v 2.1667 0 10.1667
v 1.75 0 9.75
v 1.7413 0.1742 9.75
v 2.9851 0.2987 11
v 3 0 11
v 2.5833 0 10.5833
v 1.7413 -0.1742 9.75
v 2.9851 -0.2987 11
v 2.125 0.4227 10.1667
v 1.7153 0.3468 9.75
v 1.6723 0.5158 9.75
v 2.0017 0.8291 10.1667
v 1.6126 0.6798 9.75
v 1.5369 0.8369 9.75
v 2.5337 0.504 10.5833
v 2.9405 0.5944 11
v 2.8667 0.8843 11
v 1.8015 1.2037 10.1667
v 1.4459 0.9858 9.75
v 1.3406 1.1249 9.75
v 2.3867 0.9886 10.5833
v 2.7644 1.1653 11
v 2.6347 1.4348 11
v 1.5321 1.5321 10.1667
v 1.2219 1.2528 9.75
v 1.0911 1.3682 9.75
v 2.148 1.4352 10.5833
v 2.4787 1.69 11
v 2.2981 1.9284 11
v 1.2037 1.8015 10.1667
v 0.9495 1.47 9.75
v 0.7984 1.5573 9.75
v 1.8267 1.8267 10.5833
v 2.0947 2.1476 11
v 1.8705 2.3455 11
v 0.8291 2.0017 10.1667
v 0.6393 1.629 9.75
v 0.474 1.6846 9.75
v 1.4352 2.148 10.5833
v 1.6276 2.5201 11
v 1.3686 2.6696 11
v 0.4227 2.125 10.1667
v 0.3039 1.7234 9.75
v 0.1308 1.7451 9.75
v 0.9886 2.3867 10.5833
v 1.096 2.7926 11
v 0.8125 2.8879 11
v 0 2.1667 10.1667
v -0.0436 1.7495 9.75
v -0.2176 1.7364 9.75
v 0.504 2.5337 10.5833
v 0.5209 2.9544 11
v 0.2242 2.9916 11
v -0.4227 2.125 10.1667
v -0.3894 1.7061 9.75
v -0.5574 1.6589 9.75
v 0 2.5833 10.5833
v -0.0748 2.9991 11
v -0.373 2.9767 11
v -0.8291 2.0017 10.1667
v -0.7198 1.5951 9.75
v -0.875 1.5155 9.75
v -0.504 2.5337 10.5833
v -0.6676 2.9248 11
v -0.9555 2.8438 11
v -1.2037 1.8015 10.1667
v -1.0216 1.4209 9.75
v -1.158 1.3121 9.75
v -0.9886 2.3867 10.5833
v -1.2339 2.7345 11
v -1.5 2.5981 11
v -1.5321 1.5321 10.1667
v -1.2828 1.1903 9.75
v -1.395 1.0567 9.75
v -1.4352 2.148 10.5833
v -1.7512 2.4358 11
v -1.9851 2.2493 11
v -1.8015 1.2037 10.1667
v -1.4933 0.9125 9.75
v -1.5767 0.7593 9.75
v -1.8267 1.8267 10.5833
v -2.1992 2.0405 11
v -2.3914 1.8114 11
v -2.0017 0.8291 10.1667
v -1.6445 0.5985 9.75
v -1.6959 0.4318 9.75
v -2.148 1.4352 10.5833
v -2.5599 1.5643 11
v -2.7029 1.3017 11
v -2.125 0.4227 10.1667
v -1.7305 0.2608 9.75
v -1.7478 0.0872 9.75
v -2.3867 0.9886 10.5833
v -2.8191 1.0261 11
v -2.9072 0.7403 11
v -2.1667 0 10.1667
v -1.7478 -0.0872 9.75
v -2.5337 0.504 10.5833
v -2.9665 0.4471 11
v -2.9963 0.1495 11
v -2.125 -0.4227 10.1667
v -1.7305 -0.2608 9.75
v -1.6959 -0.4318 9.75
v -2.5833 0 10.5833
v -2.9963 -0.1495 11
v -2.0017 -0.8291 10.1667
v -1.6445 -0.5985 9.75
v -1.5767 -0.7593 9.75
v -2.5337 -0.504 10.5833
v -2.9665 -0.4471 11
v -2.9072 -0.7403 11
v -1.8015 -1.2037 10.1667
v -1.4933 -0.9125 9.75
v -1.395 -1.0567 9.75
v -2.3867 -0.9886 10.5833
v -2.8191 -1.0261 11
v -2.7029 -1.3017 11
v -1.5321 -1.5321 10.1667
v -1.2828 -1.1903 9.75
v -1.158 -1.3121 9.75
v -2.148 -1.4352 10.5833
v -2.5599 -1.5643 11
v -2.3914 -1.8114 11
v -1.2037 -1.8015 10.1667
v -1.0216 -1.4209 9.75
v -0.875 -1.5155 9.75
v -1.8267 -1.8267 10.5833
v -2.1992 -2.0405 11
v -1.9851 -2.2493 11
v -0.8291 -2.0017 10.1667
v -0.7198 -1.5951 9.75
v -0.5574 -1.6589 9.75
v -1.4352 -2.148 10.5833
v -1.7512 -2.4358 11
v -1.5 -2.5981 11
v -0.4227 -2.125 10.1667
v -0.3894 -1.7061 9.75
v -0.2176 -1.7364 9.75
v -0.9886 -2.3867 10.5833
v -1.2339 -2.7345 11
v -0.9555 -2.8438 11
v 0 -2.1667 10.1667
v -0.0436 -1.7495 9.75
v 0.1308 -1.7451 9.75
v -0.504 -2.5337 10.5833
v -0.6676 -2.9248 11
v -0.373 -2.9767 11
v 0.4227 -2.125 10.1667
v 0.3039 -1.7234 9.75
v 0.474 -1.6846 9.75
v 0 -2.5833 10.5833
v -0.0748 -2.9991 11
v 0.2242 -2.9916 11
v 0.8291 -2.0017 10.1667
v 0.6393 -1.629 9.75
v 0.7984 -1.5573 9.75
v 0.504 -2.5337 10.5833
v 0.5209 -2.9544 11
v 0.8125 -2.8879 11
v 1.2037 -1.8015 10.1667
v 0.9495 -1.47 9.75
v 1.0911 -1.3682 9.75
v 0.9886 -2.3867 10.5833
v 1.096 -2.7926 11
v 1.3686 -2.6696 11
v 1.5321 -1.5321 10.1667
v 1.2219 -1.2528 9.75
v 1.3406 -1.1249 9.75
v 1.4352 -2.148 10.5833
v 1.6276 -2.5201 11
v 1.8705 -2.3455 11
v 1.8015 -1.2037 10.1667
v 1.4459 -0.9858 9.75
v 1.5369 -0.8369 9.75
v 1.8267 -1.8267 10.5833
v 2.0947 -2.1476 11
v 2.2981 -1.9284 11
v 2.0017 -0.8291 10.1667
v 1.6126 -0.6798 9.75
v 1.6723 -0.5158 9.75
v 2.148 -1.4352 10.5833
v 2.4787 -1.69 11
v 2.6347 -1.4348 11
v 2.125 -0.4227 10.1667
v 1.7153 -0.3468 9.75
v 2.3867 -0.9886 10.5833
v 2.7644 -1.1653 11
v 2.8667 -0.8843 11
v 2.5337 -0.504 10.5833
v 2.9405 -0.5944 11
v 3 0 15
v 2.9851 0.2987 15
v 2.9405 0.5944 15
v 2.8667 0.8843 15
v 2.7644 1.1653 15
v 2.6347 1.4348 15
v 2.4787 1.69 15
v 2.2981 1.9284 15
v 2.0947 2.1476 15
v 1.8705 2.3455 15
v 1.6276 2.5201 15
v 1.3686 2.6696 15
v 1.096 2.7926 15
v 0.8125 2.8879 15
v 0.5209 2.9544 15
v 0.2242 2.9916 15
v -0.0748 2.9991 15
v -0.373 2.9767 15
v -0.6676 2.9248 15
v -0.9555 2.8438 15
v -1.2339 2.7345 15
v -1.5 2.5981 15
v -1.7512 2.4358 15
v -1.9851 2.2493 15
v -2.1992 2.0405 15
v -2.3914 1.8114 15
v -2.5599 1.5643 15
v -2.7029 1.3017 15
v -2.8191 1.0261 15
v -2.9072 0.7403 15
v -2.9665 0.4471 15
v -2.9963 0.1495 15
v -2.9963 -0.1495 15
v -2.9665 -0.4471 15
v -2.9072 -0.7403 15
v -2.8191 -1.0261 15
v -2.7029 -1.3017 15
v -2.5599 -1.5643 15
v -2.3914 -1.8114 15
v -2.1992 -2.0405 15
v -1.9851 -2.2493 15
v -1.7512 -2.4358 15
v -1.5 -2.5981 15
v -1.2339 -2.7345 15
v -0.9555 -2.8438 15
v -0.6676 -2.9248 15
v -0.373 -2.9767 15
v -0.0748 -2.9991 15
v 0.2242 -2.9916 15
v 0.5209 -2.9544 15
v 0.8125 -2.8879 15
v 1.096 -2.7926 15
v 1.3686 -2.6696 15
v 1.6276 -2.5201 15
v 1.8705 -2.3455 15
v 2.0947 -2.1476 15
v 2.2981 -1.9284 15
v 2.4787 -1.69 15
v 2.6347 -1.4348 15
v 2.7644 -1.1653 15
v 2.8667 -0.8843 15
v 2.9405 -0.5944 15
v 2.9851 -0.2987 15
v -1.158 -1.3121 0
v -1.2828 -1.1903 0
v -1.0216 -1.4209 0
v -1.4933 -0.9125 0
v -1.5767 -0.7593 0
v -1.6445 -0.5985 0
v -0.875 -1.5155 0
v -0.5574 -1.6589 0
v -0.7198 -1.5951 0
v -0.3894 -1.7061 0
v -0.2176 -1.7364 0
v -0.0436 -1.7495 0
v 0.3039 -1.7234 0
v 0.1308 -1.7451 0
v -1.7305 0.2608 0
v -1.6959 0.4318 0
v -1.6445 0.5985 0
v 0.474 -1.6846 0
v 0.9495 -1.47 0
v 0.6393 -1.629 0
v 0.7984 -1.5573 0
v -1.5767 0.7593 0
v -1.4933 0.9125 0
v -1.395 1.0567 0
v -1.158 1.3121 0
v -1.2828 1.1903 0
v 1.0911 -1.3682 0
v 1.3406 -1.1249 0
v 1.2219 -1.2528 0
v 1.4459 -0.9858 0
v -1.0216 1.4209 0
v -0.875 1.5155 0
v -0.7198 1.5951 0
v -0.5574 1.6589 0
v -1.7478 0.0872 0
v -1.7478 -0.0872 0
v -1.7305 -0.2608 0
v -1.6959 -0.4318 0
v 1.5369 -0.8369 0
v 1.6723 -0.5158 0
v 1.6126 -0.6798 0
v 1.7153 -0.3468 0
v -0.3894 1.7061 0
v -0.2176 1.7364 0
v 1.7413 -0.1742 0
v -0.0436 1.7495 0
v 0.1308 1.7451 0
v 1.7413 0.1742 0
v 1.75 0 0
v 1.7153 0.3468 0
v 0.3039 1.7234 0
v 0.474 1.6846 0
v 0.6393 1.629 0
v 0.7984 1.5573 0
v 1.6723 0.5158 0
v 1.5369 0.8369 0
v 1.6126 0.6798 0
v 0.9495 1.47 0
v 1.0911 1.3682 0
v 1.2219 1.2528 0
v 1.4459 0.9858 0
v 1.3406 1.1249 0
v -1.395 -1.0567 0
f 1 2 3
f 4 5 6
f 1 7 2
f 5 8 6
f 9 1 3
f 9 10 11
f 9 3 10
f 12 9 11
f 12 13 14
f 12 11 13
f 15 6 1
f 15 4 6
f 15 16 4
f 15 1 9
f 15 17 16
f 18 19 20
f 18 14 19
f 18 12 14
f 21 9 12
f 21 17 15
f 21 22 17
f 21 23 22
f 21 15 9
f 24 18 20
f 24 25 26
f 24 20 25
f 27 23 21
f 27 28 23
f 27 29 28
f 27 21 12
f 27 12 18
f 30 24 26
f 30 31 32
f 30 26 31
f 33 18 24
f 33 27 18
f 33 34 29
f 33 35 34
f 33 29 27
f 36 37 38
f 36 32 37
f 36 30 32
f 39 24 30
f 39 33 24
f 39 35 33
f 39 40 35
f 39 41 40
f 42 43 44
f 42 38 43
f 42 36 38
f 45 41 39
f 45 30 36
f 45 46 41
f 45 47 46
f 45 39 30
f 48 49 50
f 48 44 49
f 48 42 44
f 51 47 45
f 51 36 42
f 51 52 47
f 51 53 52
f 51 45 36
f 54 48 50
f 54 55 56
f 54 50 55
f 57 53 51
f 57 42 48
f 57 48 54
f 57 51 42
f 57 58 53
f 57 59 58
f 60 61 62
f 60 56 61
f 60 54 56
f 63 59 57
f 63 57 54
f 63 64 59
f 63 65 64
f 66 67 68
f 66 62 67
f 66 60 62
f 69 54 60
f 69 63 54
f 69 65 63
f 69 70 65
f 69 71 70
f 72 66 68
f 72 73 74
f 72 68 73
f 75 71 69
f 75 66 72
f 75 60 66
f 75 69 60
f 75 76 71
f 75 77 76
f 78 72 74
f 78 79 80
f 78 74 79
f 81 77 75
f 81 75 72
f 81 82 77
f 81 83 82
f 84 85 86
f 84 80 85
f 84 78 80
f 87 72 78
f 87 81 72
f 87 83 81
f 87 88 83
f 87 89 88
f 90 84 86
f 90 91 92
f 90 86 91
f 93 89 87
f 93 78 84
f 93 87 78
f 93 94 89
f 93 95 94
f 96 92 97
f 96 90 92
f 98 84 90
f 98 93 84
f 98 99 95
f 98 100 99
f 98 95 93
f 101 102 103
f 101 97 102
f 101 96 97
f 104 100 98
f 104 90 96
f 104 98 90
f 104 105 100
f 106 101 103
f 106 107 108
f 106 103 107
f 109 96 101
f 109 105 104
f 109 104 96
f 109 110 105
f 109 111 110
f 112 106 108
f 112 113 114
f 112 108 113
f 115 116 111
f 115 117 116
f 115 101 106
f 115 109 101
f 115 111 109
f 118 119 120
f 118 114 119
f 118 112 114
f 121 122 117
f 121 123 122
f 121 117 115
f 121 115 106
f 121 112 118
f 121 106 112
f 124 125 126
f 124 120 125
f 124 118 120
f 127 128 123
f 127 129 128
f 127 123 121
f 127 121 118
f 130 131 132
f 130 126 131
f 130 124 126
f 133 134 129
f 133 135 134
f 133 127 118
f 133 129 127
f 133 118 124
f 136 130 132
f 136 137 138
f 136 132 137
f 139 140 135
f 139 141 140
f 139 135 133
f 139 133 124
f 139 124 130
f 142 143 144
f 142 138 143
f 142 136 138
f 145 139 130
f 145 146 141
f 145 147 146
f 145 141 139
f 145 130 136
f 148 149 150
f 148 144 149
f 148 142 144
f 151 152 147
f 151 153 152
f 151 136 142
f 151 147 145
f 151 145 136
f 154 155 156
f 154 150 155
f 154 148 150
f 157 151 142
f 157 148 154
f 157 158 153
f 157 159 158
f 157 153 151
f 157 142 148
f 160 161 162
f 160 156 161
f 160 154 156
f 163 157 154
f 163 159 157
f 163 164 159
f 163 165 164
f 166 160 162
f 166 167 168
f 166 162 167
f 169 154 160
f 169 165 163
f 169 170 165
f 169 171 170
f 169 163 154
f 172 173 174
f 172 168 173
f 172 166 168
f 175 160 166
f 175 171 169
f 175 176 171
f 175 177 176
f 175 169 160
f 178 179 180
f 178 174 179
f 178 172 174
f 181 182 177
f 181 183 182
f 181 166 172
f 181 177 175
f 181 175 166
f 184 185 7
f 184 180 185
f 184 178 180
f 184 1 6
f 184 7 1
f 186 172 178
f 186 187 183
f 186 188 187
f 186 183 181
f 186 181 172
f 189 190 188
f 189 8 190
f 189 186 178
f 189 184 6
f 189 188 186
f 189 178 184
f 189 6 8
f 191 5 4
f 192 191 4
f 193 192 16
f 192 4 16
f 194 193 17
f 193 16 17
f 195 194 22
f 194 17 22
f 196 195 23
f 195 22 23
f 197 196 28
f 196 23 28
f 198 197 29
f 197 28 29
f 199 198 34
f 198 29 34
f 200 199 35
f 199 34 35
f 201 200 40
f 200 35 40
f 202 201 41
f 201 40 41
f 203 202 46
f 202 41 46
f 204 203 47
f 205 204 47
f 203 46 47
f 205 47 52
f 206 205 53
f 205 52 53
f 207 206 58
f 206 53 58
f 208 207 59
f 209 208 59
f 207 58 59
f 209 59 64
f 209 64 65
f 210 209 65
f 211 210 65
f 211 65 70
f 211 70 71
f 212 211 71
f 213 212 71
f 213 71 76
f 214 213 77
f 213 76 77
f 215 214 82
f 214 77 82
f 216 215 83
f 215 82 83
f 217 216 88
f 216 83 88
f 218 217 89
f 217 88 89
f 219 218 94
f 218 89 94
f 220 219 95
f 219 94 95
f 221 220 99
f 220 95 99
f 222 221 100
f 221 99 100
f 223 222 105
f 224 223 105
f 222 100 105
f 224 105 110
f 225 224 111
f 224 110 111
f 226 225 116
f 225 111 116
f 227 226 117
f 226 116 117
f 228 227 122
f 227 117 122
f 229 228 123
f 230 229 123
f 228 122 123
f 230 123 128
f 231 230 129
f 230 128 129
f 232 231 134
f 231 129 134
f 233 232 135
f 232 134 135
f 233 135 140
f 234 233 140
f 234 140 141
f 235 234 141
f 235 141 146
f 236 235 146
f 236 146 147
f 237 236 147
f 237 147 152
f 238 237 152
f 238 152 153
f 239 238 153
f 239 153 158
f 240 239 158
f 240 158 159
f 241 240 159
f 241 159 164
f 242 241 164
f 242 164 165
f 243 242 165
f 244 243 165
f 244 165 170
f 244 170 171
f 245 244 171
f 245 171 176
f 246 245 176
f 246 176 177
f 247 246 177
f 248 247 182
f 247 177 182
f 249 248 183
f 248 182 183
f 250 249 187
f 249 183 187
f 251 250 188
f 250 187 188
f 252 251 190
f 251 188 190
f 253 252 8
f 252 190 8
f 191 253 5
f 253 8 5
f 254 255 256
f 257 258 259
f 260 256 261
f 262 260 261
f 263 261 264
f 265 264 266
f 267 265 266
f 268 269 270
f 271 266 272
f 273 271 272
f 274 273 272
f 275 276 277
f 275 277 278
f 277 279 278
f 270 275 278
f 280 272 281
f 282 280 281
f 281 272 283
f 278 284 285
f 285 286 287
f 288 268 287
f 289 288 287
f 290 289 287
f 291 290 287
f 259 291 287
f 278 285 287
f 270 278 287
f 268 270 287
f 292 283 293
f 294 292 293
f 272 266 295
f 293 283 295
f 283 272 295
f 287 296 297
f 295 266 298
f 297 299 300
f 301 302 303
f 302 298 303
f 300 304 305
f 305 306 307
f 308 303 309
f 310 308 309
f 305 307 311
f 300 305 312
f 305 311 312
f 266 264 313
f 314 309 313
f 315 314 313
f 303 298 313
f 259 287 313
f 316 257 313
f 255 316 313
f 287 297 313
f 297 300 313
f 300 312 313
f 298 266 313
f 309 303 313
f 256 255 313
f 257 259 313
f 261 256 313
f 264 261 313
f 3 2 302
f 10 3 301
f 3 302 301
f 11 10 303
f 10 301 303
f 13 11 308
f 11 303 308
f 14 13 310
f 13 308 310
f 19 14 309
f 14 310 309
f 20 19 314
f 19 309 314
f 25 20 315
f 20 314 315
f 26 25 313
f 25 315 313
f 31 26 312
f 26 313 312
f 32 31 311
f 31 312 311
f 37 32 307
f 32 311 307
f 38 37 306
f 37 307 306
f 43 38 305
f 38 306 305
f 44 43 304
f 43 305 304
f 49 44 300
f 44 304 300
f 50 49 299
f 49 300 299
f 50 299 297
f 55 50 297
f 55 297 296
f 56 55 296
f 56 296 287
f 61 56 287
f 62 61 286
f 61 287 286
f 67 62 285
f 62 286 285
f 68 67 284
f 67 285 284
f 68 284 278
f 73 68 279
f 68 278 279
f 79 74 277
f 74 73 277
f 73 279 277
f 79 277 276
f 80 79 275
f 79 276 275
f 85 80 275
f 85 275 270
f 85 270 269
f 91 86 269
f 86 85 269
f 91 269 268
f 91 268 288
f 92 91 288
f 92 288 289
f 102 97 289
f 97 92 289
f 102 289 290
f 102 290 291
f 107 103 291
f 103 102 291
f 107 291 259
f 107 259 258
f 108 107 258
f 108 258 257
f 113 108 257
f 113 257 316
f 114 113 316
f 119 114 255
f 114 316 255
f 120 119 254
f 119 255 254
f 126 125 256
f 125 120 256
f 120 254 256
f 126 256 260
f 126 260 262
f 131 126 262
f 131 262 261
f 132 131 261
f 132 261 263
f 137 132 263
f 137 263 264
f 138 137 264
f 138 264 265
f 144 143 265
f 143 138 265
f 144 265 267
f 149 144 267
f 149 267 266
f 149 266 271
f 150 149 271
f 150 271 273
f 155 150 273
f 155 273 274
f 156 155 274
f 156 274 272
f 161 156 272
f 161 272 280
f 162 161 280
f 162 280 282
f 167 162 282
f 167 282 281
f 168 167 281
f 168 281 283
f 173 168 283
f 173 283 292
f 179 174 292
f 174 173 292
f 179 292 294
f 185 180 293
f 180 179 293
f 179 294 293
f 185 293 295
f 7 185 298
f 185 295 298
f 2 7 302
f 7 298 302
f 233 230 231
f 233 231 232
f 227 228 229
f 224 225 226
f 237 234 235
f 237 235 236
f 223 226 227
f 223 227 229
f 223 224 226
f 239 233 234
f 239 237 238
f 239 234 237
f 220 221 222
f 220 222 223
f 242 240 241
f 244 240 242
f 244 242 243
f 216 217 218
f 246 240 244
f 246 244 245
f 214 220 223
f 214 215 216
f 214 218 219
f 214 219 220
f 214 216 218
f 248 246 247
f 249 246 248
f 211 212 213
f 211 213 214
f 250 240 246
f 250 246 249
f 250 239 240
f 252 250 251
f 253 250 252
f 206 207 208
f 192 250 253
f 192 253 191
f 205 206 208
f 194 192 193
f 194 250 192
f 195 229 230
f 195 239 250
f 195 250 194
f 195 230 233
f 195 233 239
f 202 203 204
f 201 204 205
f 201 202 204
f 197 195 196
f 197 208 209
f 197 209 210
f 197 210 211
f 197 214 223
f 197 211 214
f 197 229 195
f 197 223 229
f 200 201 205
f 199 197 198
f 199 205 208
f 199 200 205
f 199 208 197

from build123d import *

# Parameters (mm, degrees)
CYLINDER_R        = 1.75
CYLINDER_DEPTH    = 10
CYLINDER001_R     = 3
CYLINDER001_DEPTH = 4


with BuildPart() as screw_cone:
    # Cone → Cone (revolve)
    with BuildSketch(Plane(origin=(0, 0, 9), x_dir=(1, 0, 0), z_dir=(0, -1, 0))):
        Polygon((0, 0), (1, 0), (3, 2), (0, 2), align=None)
    revolve(axis=Axis((0, 0, 9), (0, 0, 1)))


with BuildPart() as screw_cylinder:
    # Cylinder → Cylinder (new body)
    with BuildSketch(Plane.XY):
        Circle(CYLINDER_R)
    extrude(amount=CYLINDER_DEPTH)


with BuildPart() as screw_fusion:
    # Cylinder001 → Cylinder001 (new body)
    with BuildSketch(Plane.XY.offset(11)):
        Circle(CYLINDER001_R)
    extrude(amount=CYLINDER001_DEPTH)

    # Fusion: union screw-cone, screw-cylinder
    add(screw_cone.part)
    add(screw_cylinder.part)


solid = screw_fusion.part
